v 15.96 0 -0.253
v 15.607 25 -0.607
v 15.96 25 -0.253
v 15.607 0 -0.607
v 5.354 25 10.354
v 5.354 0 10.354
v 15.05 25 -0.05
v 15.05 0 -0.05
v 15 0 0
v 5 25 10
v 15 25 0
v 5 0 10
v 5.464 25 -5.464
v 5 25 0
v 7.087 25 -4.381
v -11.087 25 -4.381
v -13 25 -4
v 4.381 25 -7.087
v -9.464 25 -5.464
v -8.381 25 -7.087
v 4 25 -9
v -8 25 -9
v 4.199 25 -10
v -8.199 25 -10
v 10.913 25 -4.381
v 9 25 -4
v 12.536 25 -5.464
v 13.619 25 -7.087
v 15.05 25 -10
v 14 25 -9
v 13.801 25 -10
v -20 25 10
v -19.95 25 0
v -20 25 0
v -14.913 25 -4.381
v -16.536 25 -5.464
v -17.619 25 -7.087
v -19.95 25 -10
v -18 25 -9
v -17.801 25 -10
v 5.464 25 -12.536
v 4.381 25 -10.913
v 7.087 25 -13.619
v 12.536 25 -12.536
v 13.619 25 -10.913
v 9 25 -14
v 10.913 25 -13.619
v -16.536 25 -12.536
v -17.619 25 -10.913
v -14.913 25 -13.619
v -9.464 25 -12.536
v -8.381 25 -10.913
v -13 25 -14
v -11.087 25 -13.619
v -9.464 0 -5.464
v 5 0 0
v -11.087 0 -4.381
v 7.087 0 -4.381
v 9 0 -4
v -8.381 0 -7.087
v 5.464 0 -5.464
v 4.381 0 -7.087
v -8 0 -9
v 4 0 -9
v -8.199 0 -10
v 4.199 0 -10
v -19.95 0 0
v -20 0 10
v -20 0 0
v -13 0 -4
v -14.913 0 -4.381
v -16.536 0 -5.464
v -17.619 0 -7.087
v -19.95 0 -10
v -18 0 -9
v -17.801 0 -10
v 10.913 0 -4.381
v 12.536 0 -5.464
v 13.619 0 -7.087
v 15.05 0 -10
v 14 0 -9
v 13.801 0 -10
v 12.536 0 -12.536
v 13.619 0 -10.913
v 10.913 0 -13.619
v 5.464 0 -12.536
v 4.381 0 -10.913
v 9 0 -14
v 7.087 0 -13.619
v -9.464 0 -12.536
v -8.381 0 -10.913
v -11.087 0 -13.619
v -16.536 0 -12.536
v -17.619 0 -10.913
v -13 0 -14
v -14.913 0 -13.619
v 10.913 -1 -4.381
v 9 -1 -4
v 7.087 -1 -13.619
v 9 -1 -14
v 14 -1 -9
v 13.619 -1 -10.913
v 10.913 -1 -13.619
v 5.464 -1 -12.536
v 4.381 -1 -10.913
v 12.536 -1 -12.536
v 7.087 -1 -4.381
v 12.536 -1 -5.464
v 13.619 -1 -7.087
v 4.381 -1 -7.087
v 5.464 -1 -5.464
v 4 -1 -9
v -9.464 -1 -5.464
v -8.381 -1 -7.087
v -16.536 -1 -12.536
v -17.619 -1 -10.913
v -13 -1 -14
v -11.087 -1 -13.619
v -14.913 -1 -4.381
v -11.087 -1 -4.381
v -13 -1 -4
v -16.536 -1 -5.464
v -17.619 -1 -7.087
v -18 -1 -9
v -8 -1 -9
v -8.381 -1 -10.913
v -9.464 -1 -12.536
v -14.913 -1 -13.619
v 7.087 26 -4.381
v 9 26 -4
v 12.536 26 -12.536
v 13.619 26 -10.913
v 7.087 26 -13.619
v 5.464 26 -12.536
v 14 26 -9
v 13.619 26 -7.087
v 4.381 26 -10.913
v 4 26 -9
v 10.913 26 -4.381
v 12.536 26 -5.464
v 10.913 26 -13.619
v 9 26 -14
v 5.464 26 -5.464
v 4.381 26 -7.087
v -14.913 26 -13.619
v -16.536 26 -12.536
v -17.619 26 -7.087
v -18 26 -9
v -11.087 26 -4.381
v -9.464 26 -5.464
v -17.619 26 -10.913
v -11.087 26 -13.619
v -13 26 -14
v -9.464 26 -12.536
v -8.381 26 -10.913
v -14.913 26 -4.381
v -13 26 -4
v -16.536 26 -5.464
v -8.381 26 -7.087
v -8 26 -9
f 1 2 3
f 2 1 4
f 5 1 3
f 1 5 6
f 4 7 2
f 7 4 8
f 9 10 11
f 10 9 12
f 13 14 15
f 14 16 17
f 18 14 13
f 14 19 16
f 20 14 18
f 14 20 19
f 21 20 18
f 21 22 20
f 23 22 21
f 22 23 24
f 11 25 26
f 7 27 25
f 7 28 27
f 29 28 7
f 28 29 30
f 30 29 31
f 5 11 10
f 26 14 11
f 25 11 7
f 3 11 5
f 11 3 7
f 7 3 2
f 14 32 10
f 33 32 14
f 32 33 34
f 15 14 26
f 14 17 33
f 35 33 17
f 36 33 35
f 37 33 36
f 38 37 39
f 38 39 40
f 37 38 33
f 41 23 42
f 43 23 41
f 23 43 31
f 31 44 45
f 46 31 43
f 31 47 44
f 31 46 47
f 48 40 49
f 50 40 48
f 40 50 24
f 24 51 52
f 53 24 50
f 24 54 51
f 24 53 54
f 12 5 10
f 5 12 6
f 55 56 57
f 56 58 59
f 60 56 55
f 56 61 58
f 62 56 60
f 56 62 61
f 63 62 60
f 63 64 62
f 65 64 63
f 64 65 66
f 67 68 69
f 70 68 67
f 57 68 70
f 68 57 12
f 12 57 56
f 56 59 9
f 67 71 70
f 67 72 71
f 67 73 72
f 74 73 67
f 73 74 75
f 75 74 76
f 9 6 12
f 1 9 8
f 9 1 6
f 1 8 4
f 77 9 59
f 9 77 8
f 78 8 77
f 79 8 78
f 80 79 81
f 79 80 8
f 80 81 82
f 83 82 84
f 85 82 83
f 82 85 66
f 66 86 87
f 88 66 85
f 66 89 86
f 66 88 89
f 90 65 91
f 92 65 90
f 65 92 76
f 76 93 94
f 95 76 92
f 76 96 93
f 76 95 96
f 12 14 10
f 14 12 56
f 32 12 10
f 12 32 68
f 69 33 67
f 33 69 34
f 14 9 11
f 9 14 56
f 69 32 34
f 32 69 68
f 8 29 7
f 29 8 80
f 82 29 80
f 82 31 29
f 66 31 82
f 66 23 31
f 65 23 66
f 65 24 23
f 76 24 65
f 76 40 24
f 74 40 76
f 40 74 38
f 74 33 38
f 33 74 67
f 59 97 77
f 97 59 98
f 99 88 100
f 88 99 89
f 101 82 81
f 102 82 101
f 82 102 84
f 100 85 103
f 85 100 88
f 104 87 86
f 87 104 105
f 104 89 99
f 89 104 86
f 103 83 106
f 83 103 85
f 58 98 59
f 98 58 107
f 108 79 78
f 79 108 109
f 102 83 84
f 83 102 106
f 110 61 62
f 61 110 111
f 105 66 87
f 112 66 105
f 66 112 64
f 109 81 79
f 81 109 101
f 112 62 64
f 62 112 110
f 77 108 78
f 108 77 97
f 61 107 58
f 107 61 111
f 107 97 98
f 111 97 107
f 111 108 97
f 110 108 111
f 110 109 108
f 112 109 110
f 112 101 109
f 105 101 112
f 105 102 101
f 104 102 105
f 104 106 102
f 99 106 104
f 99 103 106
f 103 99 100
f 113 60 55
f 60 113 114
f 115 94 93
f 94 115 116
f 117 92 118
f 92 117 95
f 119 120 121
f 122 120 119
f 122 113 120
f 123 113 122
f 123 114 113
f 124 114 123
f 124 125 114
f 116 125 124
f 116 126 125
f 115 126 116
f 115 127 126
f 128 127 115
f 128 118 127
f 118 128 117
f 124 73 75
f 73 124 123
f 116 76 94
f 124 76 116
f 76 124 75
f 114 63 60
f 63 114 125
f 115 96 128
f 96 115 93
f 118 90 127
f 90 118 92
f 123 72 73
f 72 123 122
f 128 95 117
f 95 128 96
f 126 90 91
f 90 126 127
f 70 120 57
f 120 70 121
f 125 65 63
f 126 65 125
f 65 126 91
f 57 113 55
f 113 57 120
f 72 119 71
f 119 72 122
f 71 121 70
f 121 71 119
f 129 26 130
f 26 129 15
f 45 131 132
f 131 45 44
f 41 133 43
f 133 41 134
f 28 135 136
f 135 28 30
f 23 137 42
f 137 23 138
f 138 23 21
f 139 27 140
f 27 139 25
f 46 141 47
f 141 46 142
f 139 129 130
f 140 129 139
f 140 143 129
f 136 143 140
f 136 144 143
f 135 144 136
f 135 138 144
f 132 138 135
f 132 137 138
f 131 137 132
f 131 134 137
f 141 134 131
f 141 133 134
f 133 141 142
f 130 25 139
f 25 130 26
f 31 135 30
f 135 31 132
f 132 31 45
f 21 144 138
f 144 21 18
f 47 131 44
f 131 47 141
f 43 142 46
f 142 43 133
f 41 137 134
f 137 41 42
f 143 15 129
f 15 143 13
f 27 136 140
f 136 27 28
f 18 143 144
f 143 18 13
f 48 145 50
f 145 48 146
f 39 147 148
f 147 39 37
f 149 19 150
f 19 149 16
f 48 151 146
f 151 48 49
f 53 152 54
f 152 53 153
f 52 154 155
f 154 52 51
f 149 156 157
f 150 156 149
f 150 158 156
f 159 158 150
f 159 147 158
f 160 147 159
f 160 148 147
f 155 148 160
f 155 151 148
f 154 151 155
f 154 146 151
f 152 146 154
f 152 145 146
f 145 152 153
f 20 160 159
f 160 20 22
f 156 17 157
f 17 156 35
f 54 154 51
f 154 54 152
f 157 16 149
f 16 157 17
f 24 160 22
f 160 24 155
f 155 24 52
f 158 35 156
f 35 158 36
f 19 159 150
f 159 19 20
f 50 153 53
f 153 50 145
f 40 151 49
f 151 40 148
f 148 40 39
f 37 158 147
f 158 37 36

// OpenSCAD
carHeight=20;
carWidth=25;
module wheel()
{
    rotate( [90,90,0] ) cylinder(h=1,r=5);
}
module windsheild(t,l)
{
    rotate( [0,45,0] ) scale( [3,5,t] ) cube(l);
}   
module carBody(wst,wsl)
{
    union()
    {
        translate( [5,0,10] ) windsheild(t=wst,l=wsl);
        scale( [5,5,2] ) translate( [-4,0,0] ) cube(wsl);
        scale( [7,5,2] ) translate( [-2.85,0,-5] ) cube(wsl);
    }
}
module chassis()
{
    union()
    {
        translate( [9,0,-9] ) wheel();
        translate( [-13,0,-9] ) wheel();
        translate( [9,26,-9] ) wheel();
        translate( [-13,26,-9] ) wheel();
    }
}    
module carModel()
{
    union()
    {   
        carBody(wst=0.1,wsl=5);
        chassis();
    }
}
module car(scl,t,r)
{
    rotate( r ) scale( [scl,scl,scl] ) translate( t ) carModel();
}
car(scl=1,t=[0,0,0],r=[0,0,0]);
//car(scl=1,t=[0,-carWidth,-carHeight],r=[0,180,180]);
